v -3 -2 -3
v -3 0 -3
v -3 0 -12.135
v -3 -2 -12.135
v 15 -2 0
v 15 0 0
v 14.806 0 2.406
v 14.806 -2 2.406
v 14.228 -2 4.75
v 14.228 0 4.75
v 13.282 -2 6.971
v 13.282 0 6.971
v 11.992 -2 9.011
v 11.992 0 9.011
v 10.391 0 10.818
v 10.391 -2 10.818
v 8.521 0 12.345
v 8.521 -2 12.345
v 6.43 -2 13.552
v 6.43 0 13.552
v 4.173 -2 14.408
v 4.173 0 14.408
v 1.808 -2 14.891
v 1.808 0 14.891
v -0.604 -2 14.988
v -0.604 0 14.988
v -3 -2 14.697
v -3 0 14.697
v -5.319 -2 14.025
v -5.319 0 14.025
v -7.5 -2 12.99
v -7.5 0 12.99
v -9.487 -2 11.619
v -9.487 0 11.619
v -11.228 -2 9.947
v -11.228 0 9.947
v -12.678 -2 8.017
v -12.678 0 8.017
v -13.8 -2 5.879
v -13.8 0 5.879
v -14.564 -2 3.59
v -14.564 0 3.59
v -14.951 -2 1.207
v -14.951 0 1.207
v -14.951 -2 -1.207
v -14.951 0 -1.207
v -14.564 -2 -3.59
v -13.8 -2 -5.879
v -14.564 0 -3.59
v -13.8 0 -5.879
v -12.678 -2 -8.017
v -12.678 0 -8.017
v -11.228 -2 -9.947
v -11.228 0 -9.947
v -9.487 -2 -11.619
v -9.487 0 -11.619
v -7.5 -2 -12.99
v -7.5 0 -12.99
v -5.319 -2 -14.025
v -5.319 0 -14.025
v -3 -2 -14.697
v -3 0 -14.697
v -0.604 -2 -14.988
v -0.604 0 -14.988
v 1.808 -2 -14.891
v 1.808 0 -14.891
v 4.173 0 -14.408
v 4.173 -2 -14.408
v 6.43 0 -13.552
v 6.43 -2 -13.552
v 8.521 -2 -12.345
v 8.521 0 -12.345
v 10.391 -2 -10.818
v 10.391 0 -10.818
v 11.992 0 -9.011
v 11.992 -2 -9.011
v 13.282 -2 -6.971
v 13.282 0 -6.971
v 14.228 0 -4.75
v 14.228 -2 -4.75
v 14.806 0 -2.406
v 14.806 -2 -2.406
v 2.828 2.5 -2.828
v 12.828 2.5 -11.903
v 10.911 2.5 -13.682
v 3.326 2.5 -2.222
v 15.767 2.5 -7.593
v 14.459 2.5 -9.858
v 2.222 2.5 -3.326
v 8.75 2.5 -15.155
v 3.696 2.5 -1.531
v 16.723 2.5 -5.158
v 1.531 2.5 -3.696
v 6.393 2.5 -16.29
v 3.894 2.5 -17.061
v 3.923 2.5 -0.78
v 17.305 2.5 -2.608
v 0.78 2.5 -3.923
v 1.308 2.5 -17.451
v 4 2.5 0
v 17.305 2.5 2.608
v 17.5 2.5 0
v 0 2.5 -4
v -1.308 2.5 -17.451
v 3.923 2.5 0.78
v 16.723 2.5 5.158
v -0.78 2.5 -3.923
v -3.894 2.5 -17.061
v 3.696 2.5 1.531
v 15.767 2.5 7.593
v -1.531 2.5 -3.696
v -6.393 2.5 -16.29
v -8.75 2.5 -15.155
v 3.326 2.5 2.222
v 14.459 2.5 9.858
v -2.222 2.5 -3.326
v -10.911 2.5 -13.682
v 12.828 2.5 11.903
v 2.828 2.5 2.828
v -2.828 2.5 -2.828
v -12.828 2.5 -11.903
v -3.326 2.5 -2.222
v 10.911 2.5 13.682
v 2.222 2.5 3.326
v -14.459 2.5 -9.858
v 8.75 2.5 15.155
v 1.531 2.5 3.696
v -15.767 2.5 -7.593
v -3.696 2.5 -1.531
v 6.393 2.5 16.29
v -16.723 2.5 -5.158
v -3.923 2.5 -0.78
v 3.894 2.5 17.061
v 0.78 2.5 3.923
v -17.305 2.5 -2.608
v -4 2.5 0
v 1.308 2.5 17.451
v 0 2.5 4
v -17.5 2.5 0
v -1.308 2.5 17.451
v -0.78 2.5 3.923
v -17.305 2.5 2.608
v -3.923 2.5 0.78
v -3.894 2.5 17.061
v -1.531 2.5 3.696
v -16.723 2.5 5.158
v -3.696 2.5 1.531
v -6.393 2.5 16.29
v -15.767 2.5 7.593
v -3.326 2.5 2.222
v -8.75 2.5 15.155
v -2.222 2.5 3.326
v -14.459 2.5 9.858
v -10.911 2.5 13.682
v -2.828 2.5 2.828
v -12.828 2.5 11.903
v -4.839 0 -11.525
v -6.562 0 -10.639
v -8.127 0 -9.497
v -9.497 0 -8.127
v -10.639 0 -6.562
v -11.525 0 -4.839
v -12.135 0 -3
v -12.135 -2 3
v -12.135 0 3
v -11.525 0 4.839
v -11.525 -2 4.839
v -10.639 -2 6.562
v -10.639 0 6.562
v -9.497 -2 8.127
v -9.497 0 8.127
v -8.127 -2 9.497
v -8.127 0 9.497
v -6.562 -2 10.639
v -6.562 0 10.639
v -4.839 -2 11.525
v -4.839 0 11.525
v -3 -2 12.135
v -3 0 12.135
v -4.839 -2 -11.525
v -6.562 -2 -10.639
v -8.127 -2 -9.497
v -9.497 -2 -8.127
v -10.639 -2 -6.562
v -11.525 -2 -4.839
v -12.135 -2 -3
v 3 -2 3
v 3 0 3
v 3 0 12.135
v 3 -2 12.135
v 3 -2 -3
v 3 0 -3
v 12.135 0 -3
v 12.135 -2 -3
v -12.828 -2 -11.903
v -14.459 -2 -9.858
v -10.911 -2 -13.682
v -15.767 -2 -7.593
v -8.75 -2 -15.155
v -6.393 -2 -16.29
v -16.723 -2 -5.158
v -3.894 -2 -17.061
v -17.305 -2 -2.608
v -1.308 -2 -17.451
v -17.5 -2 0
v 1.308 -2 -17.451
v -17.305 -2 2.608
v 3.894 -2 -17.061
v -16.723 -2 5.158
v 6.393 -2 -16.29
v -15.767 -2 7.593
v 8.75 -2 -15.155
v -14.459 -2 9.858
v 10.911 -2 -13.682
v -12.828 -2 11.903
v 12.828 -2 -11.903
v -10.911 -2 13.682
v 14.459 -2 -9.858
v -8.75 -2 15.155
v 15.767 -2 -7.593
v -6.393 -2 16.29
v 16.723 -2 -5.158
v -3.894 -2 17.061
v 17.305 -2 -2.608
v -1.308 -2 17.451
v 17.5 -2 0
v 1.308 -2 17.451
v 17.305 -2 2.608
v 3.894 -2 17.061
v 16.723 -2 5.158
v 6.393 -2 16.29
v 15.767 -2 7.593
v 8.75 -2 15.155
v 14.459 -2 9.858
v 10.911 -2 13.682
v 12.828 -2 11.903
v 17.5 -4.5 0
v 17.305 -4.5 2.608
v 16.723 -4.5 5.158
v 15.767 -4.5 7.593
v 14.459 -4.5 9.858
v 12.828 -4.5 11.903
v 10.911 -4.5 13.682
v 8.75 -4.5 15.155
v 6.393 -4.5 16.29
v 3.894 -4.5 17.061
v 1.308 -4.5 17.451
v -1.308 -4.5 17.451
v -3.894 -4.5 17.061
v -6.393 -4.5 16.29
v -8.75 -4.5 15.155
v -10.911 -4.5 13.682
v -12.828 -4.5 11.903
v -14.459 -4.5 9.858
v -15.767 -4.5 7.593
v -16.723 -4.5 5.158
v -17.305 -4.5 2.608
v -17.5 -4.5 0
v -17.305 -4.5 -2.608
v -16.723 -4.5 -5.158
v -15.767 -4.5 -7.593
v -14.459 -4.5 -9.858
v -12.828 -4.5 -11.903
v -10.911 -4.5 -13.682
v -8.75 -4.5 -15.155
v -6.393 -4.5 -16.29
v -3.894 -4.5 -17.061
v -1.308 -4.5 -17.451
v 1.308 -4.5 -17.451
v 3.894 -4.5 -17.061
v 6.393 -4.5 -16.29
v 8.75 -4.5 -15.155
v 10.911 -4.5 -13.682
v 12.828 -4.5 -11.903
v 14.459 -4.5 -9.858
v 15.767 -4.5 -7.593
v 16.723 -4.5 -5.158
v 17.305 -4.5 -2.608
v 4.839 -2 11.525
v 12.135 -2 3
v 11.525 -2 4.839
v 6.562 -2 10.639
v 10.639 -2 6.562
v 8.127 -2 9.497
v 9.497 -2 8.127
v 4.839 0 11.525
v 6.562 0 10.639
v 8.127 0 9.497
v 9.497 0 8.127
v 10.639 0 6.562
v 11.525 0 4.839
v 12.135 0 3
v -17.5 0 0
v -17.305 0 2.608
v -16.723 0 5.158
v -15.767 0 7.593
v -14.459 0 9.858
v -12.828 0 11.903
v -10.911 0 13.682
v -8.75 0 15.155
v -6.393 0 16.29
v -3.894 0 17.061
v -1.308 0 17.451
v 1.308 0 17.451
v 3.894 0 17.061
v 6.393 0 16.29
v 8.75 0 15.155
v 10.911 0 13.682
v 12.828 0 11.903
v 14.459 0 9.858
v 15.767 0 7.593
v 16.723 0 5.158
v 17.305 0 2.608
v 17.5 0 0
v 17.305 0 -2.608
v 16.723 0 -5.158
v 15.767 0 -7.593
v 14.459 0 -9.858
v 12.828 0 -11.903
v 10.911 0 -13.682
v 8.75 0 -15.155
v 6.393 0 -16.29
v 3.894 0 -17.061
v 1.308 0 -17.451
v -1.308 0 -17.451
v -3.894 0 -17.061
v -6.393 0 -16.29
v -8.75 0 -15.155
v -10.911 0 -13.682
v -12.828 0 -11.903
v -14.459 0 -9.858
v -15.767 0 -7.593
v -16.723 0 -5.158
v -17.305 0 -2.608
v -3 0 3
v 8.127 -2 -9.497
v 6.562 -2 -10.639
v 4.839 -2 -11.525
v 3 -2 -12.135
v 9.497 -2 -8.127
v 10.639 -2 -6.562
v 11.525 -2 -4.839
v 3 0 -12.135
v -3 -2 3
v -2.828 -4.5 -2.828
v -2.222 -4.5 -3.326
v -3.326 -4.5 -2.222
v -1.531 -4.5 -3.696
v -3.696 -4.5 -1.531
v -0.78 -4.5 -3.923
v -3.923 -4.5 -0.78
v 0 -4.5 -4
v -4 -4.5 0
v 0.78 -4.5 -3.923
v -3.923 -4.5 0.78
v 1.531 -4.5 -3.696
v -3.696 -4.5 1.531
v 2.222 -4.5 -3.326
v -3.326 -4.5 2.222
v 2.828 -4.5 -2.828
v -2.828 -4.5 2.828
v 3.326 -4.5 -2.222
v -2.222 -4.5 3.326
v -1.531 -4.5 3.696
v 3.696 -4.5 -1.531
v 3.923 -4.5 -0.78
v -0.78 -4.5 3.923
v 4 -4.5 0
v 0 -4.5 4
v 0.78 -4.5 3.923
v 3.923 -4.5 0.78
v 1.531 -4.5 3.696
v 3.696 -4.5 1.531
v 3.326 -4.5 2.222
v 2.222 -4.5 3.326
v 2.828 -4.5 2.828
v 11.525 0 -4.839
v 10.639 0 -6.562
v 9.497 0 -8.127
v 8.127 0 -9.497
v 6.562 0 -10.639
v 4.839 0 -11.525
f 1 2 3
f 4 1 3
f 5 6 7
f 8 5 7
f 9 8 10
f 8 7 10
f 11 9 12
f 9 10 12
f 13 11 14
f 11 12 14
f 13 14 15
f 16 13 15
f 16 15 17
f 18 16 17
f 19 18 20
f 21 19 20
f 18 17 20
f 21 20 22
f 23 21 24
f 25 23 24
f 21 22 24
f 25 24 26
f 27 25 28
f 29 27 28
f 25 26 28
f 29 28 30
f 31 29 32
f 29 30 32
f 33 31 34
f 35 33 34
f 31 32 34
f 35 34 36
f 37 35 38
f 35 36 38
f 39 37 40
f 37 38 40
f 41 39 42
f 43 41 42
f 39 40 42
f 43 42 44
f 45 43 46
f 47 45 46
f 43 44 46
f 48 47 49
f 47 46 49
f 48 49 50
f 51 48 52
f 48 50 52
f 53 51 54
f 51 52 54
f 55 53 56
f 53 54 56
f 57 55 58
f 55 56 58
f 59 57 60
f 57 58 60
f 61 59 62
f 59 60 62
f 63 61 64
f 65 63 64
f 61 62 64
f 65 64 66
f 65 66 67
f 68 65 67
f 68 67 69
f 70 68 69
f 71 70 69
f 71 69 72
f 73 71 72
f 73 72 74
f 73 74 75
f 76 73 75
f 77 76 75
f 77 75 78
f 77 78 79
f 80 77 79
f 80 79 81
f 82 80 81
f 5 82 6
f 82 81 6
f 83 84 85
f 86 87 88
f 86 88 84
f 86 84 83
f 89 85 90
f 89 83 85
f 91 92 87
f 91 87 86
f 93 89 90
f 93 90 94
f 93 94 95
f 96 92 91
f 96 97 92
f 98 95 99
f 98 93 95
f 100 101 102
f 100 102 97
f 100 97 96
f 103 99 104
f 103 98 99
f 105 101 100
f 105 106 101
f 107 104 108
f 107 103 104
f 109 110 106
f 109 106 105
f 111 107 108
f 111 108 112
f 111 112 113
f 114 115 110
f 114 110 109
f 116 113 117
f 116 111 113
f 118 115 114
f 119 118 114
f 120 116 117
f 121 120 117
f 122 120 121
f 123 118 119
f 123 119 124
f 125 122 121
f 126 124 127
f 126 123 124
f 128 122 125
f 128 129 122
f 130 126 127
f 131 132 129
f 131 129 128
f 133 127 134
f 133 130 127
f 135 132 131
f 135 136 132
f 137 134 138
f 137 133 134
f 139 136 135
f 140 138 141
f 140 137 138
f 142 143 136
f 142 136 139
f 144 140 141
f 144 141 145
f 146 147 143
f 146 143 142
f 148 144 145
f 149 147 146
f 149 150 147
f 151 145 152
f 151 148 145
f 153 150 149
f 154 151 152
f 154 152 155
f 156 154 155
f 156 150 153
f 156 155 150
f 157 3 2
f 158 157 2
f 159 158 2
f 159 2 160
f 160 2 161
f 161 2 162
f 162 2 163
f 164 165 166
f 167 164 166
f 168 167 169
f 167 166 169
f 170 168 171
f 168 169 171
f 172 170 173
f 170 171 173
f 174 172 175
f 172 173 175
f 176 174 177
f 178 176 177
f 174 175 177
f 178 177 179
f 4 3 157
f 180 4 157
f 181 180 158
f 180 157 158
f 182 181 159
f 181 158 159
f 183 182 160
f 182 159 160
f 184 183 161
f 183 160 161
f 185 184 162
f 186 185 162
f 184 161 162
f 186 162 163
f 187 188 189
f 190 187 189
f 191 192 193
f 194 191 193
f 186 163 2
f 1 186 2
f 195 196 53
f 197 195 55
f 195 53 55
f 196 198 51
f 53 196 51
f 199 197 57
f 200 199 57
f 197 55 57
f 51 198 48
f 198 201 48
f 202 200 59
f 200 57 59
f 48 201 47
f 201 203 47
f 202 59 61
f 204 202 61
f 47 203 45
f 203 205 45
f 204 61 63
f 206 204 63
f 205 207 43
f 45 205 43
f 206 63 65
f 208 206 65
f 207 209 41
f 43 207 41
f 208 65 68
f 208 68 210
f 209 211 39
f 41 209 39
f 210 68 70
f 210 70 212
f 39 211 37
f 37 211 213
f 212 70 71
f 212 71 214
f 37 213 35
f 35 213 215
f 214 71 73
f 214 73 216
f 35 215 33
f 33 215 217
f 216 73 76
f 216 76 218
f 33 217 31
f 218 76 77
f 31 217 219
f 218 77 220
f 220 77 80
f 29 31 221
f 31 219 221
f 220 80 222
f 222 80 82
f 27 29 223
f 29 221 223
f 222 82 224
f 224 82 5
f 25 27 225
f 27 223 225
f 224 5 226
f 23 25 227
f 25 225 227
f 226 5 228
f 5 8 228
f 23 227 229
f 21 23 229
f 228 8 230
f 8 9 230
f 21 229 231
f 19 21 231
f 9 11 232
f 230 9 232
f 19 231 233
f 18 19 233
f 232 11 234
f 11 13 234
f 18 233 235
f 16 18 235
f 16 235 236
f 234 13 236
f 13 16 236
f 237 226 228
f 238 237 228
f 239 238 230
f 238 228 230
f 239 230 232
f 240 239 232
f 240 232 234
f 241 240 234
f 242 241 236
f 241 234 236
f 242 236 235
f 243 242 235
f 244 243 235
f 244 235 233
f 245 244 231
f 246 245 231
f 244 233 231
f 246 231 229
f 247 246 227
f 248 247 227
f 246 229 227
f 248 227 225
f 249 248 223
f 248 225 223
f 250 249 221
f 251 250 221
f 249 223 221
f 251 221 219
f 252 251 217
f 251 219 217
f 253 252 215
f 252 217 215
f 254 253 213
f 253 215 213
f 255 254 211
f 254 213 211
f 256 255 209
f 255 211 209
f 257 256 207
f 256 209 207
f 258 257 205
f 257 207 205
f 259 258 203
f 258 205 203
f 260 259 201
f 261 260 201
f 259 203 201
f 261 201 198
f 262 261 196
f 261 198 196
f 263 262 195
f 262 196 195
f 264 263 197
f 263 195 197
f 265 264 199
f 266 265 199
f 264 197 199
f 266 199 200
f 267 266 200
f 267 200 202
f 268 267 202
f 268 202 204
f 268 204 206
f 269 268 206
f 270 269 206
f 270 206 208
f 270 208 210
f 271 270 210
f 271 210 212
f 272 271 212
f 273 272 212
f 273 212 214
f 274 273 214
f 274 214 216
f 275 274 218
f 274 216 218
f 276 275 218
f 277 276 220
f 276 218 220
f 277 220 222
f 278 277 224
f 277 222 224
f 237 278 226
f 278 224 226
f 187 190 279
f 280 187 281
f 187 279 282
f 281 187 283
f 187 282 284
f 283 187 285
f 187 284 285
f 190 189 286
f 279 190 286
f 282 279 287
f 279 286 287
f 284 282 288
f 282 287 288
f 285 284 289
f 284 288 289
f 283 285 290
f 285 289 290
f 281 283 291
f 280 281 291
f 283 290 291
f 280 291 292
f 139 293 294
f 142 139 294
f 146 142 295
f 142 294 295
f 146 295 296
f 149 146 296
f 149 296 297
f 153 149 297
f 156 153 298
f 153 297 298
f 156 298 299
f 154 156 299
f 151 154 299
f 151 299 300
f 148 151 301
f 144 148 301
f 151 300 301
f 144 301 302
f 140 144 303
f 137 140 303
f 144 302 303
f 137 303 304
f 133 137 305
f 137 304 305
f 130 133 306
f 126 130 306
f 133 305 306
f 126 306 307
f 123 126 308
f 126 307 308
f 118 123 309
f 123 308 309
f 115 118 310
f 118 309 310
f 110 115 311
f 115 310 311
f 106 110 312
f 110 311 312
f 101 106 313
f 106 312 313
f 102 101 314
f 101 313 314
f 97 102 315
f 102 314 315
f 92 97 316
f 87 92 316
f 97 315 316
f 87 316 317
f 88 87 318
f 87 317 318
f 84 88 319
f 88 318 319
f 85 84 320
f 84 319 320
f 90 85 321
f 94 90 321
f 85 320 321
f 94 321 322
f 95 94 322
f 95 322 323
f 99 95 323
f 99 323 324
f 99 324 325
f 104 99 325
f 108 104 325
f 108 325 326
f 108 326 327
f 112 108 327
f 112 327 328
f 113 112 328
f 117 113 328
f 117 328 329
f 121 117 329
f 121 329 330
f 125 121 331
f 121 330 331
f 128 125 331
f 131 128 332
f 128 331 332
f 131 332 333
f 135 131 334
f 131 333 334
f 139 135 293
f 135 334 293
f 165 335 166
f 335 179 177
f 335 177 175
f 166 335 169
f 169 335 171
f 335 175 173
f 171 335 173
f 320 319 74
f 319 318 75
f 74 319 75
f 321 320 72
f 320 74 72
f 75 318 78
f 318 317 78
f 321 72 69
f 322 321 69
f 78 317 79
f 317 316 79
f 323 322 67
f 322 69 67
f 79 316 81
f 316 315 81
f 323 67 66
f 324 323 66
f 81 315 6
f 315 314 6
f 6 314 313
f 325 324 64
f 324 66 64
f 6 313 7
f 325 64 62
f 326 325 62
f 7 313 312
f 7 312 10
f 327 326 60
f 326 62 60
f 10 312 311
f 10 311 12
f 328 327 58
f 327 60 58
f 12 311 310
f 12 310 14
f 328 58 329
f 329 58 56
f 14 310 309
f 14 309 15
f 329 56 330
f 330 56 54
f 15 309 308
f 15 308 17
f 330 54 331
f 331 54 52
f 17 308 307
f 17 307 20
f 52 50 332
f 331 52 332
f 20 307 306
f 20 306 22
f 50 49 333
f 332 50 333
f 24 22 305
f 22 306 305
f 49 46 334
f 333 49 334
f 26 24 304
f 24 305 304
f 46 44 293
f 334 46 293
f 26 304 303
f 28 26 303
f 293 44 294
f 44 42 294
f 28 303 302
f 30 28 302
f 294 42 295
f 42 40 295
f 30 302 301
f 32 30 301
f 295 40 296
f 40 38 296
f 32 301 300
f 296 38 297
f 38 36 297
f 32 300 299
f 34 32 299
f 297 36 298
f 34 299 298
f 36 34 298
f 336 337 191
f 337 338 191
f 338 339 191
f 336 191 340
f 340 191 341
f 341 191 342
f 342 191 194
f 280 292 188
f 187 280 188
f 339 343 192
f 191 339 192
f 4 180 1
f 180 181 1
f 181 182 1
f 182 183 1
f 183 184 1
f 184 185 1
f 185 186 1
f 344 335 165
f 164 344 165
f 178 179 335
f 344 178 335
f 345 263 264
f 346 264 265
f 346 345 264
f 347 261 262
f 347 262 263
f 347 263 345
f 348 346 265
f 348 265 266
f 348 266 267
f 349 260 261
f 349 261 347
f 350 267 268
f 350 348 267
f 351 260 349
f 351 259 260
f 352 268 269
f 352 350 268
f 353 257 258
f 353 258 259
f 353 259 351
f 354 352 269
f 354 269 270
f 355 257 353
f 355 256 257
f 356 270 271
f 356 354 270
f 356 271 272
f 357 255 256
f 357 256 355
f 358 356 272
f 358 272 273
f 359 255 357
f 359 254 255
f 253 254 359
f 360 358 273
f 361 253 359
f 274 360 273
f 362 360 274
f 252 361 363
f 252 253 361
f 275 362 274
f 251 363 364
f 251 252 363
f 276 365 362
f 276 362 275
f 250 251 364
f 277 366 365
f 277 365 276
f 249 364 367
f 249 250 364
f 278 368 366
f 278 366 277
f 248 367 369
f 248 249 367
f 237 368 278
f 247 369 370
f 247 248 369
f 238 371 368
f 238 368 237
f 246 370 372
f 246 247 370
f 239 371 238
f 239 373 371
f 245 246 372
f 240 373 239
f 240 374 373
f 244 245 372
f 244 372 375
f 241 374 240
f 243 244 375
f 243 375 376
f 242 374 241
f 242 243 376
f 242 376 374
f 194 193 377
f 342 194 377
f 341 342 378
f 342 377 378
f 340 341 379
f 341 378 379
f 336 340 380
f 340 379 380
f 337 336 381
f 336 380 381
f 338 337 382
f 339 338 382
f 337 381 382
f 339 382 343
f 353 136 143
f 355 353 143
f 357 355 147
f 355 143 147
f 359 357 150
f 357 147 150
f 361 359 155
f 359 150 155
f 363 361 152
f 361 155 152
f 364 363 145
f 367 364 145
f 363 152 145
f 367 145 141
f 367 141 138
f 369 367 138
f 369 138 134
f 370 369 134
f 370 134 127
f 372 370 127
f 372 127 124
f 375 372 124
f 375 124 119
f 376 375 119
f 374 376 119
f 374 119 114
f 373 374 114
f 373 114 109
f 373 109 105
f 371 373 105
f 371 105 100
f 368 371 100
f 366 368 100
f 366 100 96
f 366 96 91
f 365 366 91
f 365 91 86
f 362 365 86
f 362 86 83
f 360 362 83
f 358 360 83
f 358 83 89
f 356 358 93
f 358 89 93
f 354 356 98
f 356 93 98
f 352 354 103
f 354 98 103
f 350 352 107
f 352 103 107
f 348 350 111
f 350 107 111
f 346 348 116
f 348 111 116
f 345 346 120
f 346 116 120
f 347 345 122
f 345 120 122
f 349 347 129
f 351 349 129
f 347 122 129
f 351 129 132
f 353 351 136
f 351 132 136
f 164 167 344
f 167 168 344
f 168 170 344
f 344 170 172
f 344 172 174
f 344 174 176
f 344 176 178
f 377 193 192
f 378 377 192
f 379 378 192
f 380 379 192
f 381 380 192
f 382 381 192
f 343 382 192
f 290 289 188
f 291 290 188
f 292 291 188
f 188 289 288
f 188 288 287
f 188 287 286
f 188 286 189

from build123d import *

# Parameters (mm, degrees)
F0_R     = 15
F1_DEPTH = 2
F2_R     = 17.5
F3_DEPTH = 2.5
F4_R     = 17.5
F5_DEPTH = 2.5
F7_D     = 8


with BuildPart() as f1:
    # F0 (on Front) → F1 (new body)
    with BuildSketch(Plane.XZ):
        Circle(F0_R)
        with BuildLine():
            Line((-3, -3), (-3, -12.134661))
            ThreePointArc((-3, -12.134661), (-8.838835, -8.838835), (-12.134661, -3))
            Line((-12.134661, -3), (-3, -3))
        make_face(mode=Mode.SUBTRACT)
        with BuildLine():
            Line((3, -12.134661), (3, -3))
            Line((3, -3), (12.134661, -3))
            ThreePointArc((12.134661, -3), (8.838835, -8.838835), (3, -12.134661))
        make_face(mode=Mode.SUBTRACT)
        with BuildLine():
            ThreePointArc((-12.134661, 3), (-8.838835, 8.838835), (-3, 12.134661))
            Line((-3, 12.134661), (-3, 3))
            Line((-3, 3), (-12.134661, 3))
        make_face(mode=Mode.SUBTRACT)
        with BuildLine():
            Line((12.134661, 3), (3, 3))
            Line((3, 3), (3, 12.134661))
            ThreePointArc((3, 12.134661), (8.838835, 8.838835), (12.134661, 3))
        make_face(mode=Mode.SUBTRACT)
    extrude(amount=F1_DEPTH)

    # F2 (on face) → F3 (join)
    with BuildSketch(Plane(origin=(0, 0, 0), x_dir=(-1, 0, 0), z_dir=(0, 1, 0))):
        Circle(F2_R)
    extrude(amount=F3_DEPTH)

    # F4 (on face) → F5 (join)
    with BuildSketch(Plane.XZ.offset(2)):
        Circle(F4_R)
    extrude(amount=F5_DEPTH)

    # F7 (through all)
    with Locations(Plane.XZ.offset(4.5)):
        with Locations((0, 0)):
            Hole(F7_D / 2)


solid = f1.part
